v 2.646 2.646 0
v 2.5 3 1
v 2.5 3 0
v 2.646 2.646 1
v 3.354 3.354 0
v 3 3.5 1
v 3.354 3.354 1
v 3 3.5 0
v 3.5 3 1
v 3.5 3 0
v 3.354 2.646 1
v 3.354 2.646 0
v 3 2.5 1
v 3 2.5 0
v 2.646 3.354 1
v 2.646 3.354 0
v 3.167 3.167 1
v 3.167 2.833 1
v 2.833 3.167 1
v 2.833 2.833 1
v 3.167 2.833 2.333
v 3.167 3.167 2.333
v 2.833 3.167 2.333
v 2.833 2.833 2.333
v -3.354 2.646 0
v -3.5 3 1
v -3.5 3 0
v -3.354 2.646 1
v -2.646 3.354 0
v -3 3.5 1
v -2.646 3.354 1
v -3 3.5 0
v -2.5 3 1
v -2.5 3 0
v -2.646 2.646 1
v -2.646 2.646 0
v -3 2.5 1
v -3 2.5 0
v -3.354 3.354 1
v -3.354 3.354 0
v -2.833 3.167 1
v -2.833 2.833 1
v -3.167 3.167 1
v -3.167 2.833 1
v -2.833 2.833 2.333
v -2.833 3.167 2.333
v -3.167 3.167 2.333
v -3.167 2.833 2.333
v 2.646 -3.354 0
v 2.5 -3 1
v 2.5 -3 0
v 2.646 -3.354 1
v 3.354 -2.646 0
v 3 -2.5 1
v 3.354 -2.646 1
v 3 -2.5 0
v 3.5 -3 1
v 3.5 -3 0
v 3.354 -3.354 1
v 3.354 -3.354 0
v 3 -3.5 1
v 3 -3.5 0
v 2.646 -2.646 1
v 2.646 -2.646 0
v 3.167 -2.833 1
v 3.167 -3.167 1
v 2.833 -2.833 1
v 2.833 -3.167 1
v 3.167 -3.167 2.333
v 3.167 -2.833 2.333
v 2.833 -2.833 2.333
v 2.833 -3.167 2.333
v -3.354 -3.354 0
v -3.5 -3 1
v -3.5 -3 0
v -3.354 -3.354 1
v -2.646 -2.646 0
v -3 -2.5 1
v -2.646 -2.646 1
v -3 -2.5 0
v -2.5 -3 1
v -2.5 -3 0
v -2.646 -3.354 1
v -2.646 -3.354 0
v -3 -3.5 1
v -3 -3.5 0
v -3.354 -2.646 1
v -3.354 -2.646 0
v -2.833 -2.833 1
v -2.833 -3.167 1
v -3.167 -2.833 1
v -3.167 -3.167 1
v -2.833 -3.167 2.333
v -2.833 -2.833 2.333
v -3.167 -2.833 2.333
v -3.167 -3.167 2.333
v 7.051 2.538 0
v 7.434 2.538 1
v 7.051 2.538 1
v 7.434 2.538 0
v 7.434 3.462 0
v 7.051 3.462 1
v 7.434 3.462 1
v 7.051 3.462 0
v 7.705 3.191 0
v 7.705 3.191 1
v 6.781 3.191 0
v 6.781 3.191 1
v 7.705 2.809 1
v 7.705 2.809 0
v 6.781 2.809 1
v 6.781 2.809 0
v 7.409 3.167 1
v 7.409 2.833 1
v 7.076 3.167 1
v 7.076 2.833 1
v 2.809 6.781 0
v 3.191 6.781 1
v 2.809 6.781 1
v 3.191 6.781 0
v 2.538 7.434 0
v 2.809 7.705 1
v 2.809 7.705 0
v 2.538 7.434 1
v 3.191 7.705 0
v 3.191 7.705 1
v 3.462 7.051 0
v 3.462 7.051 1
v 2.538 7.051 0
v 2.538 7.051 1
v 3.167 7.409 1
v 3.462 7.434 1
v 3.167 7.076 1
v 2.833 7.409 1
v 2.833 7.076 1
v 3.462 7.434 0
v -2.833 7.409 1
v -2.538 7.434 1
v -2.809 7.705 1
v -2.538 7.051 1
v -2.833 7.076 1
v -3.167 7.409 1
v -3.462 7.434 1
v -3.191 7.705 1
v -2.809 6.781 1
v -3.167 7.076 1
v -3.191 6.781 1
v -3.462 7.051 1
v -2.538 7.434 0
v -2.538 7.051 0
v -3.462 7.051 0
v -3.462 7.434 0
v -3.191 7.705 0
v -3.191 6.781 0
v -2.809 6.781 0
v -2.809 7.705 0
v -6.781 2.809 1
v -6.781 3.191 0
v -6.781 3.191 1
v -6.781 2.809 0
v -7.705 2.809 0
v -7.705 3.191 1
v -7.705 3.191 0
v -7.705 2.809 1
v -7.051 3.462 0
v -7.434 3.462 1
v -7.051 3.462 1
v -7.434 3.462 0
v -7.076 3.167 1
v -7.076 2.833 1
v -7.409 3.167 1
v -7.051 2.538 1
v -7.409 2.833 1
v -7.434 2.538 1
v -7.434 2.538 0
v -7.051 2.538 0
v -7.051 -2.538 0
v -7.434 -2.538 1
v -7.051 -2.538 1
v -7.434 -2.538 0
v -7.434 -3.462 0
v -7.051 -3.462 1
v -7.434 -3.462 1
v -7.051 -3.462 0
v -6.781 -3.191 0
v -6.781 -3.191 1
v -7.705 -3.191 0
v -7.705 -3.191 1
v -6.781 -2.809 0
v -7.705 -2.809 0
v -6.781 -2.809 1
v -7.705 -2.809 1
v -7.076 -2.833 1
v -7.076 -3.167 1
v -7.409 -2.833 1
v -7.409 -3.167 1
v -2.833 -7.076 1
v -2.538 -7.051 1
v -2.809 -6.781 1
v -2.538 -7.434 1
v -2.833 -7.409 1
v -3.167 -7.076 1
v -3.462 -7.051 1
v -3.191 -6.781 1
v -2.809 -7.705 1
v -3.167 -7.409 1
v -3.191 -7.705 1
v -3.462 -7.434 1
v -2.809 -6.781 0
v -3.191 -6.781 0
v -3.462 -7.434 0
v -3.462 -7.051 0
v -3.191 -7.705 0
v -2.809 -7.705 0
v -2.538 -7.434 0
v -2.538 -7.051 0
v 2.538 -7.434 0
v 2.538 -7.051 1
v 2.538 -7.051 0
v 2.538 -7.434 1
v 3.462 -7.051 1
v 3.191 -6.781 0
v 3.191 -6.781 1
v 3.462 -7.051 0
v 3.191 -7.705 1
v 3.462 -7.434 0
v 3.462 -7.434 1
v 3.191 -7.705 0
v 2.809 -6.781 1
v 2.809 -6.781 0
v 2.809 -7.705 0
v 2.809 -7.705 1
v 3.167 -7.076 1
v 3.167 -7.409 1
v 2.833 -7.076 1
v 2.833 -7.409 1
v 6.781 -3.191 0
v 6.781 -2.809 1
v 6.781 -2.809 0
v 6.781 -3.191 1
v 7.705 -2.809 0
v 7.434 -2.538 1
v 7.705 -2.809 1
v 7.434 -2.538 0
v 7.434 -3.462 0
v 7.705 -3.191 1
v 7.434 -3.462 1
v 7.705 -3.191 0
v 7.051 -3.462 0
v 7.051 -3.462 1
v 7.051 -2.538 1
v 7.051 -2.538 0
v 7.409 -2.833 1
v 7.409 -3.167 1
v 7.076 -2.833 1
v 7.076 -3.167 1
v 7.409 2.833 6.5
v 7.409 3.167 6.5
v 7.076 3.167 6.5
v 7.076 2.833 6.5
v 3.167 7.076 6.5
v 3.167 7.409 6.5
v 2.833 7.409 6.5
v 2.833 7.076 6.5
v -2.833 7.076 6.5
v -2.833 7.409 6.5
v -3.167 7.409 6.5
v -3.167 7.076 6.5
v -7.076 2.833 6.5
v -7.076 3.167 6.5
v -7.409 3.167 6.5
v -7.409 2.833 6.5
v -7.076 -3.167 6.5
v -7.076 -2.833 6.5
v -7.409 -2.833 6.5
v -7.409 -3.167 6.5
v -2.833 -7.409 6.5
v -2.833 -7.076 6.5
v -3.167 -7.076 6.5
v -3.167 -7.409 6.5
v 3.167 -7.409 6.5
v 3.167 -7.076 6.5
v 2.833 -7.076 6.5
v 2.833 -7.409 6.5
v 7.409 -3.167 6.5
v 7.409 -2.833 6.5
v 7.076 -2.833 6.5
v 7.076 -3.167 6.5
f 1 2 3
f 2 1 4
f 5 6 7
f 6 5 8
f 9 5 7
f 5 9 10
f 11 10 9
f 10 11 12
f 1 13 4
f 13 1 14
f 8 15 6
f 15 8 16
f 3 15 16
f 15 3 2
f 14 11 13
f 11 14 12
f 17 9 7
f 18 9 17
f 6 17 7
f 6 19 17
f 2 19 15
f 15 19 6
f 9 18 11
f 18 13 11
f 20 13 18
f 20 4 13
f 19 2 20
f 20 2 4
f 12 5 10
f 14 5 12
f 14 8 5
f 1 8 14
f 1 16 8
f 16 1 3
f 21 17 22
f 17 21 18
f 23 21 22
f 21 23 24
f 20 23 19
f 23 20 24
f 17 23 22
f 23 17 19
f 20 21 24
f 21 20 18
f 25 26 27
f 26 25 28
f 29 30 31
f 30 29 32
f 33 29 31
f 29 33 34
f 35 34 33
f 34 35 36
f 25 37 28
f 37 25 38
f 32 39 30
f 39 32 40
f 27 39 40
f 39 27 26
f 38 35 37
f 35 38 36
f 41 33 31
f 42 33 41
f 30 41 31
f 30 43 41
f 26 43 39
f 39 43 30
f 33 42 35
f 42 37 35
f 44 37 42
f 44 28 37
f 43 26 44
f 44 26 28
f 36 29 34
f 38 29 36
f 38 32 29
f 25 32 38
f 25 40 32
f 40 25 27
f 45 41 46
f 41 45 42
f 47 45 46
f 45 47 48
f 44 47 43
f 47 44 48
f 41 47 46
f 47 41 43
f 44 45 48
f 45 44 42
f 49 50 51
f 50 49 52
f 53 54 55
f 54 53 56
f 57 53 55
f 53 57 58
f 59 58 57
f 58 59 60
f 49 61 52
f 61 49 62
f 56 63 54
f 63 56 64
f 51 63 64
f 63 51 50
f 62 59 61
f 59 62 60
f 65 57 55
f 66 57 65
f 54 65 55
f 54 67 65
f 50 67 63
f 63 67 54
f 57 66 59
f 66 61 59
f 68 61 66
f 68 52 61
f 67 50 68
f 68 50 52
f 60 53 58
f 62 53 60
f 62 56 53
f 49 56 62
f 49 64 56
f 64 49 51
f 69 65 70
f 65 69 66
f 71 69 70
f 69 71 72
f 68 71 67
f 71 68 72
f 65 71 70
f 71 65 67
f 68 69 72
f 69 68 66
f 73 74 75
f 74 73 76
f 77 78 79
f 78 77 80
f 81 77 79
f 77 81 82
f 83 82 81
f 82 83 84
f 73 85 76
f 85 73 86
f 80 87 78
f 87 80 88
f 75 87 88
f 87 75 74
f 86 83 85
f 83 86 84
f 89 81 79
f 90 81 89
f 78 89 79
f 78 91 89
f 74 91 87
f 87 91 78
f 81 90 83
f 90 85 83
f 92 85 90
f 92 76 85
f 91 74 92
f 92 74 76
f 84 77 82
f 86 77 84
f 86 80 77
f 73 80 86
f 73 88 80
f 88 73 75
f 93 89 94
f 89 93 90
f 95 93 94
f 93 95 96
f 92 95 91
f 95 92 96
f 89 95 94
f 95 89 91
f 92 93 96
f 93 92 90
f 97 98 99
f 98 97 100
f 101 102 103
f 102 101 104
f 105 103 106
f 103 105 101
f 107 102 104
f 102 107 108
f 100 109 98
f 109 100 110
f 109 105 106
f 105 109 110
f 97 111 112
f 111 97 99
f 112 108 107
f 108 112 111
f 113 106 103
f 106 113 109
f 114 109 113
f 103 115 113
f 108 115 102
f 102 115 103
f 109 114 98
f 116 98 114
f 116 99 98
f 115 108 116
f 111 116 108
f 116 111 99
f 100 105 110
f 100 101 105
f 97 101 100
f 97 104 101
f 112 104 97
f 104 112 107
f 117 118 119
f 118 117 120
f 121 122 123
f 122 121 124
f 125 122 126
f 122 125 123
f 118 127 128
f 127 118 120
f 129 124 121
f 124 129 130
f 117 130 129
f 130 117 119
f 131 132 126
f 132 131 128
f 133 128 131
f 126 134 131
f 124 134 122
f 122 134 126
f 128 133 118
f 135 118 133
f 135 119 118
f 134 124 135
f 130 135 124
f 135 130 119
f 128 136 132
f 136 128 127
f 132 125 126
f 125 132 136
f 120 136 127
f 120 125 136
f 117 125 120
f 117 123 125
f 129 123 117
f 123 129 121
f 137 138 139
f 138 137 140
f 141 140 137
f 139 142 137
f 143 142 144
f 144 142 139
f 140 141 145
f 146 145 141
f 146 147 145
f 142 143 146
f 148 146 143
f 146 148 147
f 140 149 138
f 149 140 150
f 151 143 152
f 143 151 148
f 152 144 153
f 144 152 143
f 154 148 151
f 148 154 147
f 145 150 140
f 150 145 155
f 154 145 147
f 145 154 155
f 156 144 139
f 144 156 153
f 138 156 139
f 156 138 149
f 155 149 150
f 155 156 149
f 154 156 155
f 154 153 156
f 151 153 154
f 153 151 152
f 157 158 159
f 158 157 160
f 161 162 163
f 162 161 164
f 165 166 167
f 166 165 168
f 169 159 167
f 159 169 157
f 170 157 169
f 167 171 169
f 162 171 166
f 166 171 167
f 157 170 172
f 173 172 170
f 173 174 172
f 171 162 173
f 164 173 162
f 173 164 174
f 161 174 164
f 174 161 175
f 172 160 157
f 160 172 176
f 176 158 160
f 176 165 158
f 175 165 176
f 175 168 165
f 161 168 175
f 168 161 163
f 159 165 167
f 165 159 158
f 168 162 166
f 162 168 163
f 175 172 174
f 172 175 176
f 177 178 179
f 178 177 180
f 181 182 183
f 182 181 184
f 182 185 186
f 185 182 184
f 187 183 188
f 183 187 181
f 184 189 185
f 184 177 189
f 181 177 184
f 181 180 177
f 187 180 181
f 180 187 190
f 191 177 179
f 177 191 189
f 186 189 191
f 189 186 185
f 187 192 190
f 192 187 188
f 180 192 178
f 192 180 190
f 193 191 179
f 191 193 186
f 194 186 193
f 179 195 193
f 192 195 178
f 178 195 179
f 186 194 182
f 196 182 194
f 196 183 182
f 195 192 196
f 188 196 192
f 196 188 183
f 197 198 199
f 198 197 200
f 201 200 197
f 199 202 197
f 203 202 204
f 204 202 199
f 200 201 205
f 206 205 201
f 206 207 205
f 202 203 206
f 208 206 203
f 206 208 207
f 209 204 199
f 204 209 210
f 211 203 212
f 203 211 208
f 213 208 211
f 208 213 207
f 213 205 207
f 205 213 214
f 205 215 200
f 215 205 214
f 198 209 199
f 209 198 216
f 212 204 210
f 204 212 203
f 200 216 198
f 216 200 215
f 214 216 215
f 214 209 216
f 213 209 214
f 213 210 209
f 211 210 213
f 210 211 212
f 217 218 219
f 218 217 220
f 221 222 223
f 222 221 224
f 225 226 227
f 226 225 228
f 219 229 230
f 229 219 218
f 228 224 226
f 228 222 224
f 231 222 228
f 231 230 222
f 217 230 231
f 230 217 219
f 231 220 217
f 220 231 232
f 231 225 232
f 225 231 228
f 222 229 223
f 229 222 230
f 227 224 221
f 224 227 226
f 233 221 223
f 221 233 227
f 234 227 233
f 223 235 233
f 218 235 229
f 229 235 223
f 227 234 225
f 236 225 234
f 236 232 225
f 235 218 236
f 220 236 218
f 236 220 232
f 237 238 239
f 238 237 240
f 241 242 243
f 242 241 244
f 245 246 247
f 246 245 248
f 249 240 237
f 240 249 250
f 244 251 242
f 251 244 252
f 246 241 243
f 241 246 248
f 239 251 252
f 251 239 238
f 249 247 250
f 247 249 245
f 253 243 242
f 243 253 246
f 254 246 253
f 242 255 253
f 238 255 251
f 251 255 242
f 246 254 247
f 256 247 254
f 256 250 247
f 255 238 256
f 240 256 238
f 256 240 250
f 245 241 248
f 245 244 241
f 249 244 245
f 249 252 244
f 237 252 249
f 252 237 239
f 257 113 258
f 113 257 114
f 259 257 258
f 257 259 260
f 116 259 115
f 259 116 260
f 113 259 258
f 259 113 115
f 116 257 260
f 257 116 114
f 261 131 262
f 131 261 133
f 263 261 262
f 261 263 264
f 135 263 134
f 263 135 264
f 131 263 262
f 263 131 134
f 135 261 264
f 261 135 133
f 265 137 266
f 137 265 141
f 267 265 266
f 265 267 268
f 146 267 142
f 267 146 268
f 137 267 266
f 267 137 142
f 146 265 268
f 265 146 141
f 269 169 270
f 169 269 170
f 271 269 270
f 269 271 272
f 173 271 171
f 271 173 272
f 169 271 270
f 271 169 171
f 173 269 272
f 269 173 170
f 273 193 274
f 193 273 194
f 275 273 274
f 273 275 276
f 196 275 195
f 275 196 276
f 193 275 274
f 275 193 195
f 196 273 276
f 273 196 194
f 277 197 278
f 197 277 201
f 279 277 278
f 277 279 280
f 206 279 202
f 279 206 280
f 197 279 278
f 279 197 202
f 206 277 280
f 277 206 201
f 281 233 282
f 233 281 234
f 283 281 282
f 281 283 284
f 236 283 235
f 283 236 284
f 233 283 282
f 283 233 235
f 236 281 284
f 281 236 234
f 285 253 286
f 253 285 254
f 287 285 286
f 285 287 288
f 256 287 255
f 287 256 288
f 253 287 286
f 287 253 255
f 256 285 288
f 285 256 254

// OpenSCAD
union() {
	rotate(a = 22.5000000000) {
		translate(v = [7.8393777893, 0, 0]) {
			color(c = [1, 0, 0]) {
				cylinder($fn = 8, h = 1.0000000000, r = 0.5000000000);
			}
		}
	}
	rotate(a = 67.5000000000) {
		translate(v = [7.8393777893, 0, 0]) {
			color(c = [1, 0, 0]) {
				cylinder($fn = 8, h = 1.0000000000, r = 0.5000000000);
			}
		}
	}
	rotate(a = 112.5000000000) {
		translate(v = [7.8393777893, 0, 0]) {
			color(c = [1, 0, 0]) {
				cylinder($fn = 8, h = 1.0000000000, r = 0.5000000000);
			}
		}
	}
	rotate(a = 157.5000000000) {
		translate(v = [7.8393777893, 0, 0]) {
			color(c = [1, 0, 0]) {
				cylinder($fn = 8, h = 1.0000000000, r = 0.5000000000);
			}
		}
	}
	rotate(a = 202.5000000000) {
		translate(v = [7.8393777893, 0, 0]) {
			color(c = [1, 0, 0]) {
				cylinder($fn = 8, h = 1.0000000000, r = 0.5000000000);
			}
		}
	}
	rotate(a = 247.5000000000) {
		translate(v = [7.8393777893, 0, 0]) {
			color(c = [1, 0, 0]) {
				cylinder($fn = 8, h = 1.0000000000, r = 0.5000000000);
			}
		}
	}
	rotate(a = 292.5000000000) {
		translate(v = [7.8393777893, 0, 0]) {
			color(c = [1, 0, 0]) {
				cylinder($fn = 8, h = 1.0000000000, r = 0.5000000000);
			}
		}
	}
	rotate(a = 337.5000000000) {
		translate(v = [7.8393777893, 0, 0]) {
			color(c = [1, 0, 0]) {
				cylinder($fn = 8, h = 1.0000000000, r = 0.5000000000);
			}
		}
	}
	translate(v = [3.0000000000, 3.0000000000, 0]) {
		color(c = [1, 0, 0]) {
			cylinder($fn = 8, h = 1.0000000000, r = 0.5000000000);
		}
		translate(v = [-0.1666666667, -0.1666666667, 1.0000000000]) {
			cube(size = [0.3333333333, 0.3333333333, 1.3333333333]);
		}
	}
	translate(v = [-3.0000000000, 3.0000000000, 0]) {
		color(c = [1, 0, 0]) {
			cylinder($fn = 8, h = 1.0000000000, r = 0.5000000000);
		}
		translate(v = [-0.1666666667, -0.1666666667, 1.0000000000]) {
			cube(size = [0.3333333333, 0.3333333333, 1.3333333333]);
		}
	}
	translate(v = [3.0000000000, -3.0000000000, 0]) {
		color(c = [1, 0, 0]) {
			cylinder($fn = 8, h = 1.0000000000, r = 0.5000000000);
		}
		translate(v = [-0.1666666667, -0.1666666667, 1.0000000000]) {
			cube(size = [0.3333333333, 0.3333333333, 1.3333333333]);
		}
	}
	translate(v = [-3.0000000000, -3.0000000000, 0]) {
		color(c = [1, 0, 0]) {
			cylinder($fn = 8, h = 1.0000000000, r = 0.5000000000);
		}
		translate(v = [-0.1666666667, -0.1666666667, 1.0000000000]) {
			cube(size = [0.3333333333, 0.3333333333, 1.3333333333]);
		}
	}
	translate(v = [7.2426406871, 3.0000000000, 0]) {
		translate(v = [-0.1666666667, -0.1666666667, 1.0000000000]) {
			cube(size = [0.3333333333, 0.3333333333, 5.5000000000]);
		}
	}
	translate(v = [3.0000000000, 7.2426406871, 0]) {
		translate(v = [-0.1666666667, -0.1666666667, 1.0000000000]) {
			cube(size = [0.3333333333, 0.3333333333, 5.5000000000]);
		}
	}
	translate(v = [-3.0000000000, 7.2426406871, 0]) {
		translate(v = [-0.1666666667, -0.1666666667, 1.0000000000]) {
			cube(size = [0.3333333333, 0.3333333333, 5.5000000000]);
		}
	}
	translate(v = [-7.2426406871, 3.0000000000, 0]) {
		translate(v = [-0.1666666667, -0.1666666667, 1.0000000000]) {
			cube(size = [0.3333333333, 0.3333333333, 5.5000000000]);
		}
	}
	translate(v = [-7.2426406871, -3.0000000000, 0]) {
		translate(v = [-0.1666666667, -0.1666666667, 1.0000000000]) {
			cube(size = [0.3333333333, 0.3333333333, 5.5000000000]);
		}
	}
	translate(v = [-3.0000000000, -7.2426406871, 0]) {
		translate(v = [-0.1666666667, -0.1666666667, 1.0000000000]) {
			cube(size = [0.3333333333, 0.3333333333, 5.5000000000]);
		}
	}
	translate(v = [3.0000000000, -7.2426406871, 0]) {
		translate(v = [-0.1666666667, -0.1666666667, 1.0000000000]) {
			cube(size = [0.3333333333, 0.3333333333, 5.5000000000]);
		}
	}
	translate(v = [7.2426406871, -3.0000000000, 0]) {
		translate(v = [-0.1666666667, -0.1666666667, 1.0000000000]) {
			cube(size = [0.3333333333, 0.3333333333, 5.5000000000]);
		}
	}
}
